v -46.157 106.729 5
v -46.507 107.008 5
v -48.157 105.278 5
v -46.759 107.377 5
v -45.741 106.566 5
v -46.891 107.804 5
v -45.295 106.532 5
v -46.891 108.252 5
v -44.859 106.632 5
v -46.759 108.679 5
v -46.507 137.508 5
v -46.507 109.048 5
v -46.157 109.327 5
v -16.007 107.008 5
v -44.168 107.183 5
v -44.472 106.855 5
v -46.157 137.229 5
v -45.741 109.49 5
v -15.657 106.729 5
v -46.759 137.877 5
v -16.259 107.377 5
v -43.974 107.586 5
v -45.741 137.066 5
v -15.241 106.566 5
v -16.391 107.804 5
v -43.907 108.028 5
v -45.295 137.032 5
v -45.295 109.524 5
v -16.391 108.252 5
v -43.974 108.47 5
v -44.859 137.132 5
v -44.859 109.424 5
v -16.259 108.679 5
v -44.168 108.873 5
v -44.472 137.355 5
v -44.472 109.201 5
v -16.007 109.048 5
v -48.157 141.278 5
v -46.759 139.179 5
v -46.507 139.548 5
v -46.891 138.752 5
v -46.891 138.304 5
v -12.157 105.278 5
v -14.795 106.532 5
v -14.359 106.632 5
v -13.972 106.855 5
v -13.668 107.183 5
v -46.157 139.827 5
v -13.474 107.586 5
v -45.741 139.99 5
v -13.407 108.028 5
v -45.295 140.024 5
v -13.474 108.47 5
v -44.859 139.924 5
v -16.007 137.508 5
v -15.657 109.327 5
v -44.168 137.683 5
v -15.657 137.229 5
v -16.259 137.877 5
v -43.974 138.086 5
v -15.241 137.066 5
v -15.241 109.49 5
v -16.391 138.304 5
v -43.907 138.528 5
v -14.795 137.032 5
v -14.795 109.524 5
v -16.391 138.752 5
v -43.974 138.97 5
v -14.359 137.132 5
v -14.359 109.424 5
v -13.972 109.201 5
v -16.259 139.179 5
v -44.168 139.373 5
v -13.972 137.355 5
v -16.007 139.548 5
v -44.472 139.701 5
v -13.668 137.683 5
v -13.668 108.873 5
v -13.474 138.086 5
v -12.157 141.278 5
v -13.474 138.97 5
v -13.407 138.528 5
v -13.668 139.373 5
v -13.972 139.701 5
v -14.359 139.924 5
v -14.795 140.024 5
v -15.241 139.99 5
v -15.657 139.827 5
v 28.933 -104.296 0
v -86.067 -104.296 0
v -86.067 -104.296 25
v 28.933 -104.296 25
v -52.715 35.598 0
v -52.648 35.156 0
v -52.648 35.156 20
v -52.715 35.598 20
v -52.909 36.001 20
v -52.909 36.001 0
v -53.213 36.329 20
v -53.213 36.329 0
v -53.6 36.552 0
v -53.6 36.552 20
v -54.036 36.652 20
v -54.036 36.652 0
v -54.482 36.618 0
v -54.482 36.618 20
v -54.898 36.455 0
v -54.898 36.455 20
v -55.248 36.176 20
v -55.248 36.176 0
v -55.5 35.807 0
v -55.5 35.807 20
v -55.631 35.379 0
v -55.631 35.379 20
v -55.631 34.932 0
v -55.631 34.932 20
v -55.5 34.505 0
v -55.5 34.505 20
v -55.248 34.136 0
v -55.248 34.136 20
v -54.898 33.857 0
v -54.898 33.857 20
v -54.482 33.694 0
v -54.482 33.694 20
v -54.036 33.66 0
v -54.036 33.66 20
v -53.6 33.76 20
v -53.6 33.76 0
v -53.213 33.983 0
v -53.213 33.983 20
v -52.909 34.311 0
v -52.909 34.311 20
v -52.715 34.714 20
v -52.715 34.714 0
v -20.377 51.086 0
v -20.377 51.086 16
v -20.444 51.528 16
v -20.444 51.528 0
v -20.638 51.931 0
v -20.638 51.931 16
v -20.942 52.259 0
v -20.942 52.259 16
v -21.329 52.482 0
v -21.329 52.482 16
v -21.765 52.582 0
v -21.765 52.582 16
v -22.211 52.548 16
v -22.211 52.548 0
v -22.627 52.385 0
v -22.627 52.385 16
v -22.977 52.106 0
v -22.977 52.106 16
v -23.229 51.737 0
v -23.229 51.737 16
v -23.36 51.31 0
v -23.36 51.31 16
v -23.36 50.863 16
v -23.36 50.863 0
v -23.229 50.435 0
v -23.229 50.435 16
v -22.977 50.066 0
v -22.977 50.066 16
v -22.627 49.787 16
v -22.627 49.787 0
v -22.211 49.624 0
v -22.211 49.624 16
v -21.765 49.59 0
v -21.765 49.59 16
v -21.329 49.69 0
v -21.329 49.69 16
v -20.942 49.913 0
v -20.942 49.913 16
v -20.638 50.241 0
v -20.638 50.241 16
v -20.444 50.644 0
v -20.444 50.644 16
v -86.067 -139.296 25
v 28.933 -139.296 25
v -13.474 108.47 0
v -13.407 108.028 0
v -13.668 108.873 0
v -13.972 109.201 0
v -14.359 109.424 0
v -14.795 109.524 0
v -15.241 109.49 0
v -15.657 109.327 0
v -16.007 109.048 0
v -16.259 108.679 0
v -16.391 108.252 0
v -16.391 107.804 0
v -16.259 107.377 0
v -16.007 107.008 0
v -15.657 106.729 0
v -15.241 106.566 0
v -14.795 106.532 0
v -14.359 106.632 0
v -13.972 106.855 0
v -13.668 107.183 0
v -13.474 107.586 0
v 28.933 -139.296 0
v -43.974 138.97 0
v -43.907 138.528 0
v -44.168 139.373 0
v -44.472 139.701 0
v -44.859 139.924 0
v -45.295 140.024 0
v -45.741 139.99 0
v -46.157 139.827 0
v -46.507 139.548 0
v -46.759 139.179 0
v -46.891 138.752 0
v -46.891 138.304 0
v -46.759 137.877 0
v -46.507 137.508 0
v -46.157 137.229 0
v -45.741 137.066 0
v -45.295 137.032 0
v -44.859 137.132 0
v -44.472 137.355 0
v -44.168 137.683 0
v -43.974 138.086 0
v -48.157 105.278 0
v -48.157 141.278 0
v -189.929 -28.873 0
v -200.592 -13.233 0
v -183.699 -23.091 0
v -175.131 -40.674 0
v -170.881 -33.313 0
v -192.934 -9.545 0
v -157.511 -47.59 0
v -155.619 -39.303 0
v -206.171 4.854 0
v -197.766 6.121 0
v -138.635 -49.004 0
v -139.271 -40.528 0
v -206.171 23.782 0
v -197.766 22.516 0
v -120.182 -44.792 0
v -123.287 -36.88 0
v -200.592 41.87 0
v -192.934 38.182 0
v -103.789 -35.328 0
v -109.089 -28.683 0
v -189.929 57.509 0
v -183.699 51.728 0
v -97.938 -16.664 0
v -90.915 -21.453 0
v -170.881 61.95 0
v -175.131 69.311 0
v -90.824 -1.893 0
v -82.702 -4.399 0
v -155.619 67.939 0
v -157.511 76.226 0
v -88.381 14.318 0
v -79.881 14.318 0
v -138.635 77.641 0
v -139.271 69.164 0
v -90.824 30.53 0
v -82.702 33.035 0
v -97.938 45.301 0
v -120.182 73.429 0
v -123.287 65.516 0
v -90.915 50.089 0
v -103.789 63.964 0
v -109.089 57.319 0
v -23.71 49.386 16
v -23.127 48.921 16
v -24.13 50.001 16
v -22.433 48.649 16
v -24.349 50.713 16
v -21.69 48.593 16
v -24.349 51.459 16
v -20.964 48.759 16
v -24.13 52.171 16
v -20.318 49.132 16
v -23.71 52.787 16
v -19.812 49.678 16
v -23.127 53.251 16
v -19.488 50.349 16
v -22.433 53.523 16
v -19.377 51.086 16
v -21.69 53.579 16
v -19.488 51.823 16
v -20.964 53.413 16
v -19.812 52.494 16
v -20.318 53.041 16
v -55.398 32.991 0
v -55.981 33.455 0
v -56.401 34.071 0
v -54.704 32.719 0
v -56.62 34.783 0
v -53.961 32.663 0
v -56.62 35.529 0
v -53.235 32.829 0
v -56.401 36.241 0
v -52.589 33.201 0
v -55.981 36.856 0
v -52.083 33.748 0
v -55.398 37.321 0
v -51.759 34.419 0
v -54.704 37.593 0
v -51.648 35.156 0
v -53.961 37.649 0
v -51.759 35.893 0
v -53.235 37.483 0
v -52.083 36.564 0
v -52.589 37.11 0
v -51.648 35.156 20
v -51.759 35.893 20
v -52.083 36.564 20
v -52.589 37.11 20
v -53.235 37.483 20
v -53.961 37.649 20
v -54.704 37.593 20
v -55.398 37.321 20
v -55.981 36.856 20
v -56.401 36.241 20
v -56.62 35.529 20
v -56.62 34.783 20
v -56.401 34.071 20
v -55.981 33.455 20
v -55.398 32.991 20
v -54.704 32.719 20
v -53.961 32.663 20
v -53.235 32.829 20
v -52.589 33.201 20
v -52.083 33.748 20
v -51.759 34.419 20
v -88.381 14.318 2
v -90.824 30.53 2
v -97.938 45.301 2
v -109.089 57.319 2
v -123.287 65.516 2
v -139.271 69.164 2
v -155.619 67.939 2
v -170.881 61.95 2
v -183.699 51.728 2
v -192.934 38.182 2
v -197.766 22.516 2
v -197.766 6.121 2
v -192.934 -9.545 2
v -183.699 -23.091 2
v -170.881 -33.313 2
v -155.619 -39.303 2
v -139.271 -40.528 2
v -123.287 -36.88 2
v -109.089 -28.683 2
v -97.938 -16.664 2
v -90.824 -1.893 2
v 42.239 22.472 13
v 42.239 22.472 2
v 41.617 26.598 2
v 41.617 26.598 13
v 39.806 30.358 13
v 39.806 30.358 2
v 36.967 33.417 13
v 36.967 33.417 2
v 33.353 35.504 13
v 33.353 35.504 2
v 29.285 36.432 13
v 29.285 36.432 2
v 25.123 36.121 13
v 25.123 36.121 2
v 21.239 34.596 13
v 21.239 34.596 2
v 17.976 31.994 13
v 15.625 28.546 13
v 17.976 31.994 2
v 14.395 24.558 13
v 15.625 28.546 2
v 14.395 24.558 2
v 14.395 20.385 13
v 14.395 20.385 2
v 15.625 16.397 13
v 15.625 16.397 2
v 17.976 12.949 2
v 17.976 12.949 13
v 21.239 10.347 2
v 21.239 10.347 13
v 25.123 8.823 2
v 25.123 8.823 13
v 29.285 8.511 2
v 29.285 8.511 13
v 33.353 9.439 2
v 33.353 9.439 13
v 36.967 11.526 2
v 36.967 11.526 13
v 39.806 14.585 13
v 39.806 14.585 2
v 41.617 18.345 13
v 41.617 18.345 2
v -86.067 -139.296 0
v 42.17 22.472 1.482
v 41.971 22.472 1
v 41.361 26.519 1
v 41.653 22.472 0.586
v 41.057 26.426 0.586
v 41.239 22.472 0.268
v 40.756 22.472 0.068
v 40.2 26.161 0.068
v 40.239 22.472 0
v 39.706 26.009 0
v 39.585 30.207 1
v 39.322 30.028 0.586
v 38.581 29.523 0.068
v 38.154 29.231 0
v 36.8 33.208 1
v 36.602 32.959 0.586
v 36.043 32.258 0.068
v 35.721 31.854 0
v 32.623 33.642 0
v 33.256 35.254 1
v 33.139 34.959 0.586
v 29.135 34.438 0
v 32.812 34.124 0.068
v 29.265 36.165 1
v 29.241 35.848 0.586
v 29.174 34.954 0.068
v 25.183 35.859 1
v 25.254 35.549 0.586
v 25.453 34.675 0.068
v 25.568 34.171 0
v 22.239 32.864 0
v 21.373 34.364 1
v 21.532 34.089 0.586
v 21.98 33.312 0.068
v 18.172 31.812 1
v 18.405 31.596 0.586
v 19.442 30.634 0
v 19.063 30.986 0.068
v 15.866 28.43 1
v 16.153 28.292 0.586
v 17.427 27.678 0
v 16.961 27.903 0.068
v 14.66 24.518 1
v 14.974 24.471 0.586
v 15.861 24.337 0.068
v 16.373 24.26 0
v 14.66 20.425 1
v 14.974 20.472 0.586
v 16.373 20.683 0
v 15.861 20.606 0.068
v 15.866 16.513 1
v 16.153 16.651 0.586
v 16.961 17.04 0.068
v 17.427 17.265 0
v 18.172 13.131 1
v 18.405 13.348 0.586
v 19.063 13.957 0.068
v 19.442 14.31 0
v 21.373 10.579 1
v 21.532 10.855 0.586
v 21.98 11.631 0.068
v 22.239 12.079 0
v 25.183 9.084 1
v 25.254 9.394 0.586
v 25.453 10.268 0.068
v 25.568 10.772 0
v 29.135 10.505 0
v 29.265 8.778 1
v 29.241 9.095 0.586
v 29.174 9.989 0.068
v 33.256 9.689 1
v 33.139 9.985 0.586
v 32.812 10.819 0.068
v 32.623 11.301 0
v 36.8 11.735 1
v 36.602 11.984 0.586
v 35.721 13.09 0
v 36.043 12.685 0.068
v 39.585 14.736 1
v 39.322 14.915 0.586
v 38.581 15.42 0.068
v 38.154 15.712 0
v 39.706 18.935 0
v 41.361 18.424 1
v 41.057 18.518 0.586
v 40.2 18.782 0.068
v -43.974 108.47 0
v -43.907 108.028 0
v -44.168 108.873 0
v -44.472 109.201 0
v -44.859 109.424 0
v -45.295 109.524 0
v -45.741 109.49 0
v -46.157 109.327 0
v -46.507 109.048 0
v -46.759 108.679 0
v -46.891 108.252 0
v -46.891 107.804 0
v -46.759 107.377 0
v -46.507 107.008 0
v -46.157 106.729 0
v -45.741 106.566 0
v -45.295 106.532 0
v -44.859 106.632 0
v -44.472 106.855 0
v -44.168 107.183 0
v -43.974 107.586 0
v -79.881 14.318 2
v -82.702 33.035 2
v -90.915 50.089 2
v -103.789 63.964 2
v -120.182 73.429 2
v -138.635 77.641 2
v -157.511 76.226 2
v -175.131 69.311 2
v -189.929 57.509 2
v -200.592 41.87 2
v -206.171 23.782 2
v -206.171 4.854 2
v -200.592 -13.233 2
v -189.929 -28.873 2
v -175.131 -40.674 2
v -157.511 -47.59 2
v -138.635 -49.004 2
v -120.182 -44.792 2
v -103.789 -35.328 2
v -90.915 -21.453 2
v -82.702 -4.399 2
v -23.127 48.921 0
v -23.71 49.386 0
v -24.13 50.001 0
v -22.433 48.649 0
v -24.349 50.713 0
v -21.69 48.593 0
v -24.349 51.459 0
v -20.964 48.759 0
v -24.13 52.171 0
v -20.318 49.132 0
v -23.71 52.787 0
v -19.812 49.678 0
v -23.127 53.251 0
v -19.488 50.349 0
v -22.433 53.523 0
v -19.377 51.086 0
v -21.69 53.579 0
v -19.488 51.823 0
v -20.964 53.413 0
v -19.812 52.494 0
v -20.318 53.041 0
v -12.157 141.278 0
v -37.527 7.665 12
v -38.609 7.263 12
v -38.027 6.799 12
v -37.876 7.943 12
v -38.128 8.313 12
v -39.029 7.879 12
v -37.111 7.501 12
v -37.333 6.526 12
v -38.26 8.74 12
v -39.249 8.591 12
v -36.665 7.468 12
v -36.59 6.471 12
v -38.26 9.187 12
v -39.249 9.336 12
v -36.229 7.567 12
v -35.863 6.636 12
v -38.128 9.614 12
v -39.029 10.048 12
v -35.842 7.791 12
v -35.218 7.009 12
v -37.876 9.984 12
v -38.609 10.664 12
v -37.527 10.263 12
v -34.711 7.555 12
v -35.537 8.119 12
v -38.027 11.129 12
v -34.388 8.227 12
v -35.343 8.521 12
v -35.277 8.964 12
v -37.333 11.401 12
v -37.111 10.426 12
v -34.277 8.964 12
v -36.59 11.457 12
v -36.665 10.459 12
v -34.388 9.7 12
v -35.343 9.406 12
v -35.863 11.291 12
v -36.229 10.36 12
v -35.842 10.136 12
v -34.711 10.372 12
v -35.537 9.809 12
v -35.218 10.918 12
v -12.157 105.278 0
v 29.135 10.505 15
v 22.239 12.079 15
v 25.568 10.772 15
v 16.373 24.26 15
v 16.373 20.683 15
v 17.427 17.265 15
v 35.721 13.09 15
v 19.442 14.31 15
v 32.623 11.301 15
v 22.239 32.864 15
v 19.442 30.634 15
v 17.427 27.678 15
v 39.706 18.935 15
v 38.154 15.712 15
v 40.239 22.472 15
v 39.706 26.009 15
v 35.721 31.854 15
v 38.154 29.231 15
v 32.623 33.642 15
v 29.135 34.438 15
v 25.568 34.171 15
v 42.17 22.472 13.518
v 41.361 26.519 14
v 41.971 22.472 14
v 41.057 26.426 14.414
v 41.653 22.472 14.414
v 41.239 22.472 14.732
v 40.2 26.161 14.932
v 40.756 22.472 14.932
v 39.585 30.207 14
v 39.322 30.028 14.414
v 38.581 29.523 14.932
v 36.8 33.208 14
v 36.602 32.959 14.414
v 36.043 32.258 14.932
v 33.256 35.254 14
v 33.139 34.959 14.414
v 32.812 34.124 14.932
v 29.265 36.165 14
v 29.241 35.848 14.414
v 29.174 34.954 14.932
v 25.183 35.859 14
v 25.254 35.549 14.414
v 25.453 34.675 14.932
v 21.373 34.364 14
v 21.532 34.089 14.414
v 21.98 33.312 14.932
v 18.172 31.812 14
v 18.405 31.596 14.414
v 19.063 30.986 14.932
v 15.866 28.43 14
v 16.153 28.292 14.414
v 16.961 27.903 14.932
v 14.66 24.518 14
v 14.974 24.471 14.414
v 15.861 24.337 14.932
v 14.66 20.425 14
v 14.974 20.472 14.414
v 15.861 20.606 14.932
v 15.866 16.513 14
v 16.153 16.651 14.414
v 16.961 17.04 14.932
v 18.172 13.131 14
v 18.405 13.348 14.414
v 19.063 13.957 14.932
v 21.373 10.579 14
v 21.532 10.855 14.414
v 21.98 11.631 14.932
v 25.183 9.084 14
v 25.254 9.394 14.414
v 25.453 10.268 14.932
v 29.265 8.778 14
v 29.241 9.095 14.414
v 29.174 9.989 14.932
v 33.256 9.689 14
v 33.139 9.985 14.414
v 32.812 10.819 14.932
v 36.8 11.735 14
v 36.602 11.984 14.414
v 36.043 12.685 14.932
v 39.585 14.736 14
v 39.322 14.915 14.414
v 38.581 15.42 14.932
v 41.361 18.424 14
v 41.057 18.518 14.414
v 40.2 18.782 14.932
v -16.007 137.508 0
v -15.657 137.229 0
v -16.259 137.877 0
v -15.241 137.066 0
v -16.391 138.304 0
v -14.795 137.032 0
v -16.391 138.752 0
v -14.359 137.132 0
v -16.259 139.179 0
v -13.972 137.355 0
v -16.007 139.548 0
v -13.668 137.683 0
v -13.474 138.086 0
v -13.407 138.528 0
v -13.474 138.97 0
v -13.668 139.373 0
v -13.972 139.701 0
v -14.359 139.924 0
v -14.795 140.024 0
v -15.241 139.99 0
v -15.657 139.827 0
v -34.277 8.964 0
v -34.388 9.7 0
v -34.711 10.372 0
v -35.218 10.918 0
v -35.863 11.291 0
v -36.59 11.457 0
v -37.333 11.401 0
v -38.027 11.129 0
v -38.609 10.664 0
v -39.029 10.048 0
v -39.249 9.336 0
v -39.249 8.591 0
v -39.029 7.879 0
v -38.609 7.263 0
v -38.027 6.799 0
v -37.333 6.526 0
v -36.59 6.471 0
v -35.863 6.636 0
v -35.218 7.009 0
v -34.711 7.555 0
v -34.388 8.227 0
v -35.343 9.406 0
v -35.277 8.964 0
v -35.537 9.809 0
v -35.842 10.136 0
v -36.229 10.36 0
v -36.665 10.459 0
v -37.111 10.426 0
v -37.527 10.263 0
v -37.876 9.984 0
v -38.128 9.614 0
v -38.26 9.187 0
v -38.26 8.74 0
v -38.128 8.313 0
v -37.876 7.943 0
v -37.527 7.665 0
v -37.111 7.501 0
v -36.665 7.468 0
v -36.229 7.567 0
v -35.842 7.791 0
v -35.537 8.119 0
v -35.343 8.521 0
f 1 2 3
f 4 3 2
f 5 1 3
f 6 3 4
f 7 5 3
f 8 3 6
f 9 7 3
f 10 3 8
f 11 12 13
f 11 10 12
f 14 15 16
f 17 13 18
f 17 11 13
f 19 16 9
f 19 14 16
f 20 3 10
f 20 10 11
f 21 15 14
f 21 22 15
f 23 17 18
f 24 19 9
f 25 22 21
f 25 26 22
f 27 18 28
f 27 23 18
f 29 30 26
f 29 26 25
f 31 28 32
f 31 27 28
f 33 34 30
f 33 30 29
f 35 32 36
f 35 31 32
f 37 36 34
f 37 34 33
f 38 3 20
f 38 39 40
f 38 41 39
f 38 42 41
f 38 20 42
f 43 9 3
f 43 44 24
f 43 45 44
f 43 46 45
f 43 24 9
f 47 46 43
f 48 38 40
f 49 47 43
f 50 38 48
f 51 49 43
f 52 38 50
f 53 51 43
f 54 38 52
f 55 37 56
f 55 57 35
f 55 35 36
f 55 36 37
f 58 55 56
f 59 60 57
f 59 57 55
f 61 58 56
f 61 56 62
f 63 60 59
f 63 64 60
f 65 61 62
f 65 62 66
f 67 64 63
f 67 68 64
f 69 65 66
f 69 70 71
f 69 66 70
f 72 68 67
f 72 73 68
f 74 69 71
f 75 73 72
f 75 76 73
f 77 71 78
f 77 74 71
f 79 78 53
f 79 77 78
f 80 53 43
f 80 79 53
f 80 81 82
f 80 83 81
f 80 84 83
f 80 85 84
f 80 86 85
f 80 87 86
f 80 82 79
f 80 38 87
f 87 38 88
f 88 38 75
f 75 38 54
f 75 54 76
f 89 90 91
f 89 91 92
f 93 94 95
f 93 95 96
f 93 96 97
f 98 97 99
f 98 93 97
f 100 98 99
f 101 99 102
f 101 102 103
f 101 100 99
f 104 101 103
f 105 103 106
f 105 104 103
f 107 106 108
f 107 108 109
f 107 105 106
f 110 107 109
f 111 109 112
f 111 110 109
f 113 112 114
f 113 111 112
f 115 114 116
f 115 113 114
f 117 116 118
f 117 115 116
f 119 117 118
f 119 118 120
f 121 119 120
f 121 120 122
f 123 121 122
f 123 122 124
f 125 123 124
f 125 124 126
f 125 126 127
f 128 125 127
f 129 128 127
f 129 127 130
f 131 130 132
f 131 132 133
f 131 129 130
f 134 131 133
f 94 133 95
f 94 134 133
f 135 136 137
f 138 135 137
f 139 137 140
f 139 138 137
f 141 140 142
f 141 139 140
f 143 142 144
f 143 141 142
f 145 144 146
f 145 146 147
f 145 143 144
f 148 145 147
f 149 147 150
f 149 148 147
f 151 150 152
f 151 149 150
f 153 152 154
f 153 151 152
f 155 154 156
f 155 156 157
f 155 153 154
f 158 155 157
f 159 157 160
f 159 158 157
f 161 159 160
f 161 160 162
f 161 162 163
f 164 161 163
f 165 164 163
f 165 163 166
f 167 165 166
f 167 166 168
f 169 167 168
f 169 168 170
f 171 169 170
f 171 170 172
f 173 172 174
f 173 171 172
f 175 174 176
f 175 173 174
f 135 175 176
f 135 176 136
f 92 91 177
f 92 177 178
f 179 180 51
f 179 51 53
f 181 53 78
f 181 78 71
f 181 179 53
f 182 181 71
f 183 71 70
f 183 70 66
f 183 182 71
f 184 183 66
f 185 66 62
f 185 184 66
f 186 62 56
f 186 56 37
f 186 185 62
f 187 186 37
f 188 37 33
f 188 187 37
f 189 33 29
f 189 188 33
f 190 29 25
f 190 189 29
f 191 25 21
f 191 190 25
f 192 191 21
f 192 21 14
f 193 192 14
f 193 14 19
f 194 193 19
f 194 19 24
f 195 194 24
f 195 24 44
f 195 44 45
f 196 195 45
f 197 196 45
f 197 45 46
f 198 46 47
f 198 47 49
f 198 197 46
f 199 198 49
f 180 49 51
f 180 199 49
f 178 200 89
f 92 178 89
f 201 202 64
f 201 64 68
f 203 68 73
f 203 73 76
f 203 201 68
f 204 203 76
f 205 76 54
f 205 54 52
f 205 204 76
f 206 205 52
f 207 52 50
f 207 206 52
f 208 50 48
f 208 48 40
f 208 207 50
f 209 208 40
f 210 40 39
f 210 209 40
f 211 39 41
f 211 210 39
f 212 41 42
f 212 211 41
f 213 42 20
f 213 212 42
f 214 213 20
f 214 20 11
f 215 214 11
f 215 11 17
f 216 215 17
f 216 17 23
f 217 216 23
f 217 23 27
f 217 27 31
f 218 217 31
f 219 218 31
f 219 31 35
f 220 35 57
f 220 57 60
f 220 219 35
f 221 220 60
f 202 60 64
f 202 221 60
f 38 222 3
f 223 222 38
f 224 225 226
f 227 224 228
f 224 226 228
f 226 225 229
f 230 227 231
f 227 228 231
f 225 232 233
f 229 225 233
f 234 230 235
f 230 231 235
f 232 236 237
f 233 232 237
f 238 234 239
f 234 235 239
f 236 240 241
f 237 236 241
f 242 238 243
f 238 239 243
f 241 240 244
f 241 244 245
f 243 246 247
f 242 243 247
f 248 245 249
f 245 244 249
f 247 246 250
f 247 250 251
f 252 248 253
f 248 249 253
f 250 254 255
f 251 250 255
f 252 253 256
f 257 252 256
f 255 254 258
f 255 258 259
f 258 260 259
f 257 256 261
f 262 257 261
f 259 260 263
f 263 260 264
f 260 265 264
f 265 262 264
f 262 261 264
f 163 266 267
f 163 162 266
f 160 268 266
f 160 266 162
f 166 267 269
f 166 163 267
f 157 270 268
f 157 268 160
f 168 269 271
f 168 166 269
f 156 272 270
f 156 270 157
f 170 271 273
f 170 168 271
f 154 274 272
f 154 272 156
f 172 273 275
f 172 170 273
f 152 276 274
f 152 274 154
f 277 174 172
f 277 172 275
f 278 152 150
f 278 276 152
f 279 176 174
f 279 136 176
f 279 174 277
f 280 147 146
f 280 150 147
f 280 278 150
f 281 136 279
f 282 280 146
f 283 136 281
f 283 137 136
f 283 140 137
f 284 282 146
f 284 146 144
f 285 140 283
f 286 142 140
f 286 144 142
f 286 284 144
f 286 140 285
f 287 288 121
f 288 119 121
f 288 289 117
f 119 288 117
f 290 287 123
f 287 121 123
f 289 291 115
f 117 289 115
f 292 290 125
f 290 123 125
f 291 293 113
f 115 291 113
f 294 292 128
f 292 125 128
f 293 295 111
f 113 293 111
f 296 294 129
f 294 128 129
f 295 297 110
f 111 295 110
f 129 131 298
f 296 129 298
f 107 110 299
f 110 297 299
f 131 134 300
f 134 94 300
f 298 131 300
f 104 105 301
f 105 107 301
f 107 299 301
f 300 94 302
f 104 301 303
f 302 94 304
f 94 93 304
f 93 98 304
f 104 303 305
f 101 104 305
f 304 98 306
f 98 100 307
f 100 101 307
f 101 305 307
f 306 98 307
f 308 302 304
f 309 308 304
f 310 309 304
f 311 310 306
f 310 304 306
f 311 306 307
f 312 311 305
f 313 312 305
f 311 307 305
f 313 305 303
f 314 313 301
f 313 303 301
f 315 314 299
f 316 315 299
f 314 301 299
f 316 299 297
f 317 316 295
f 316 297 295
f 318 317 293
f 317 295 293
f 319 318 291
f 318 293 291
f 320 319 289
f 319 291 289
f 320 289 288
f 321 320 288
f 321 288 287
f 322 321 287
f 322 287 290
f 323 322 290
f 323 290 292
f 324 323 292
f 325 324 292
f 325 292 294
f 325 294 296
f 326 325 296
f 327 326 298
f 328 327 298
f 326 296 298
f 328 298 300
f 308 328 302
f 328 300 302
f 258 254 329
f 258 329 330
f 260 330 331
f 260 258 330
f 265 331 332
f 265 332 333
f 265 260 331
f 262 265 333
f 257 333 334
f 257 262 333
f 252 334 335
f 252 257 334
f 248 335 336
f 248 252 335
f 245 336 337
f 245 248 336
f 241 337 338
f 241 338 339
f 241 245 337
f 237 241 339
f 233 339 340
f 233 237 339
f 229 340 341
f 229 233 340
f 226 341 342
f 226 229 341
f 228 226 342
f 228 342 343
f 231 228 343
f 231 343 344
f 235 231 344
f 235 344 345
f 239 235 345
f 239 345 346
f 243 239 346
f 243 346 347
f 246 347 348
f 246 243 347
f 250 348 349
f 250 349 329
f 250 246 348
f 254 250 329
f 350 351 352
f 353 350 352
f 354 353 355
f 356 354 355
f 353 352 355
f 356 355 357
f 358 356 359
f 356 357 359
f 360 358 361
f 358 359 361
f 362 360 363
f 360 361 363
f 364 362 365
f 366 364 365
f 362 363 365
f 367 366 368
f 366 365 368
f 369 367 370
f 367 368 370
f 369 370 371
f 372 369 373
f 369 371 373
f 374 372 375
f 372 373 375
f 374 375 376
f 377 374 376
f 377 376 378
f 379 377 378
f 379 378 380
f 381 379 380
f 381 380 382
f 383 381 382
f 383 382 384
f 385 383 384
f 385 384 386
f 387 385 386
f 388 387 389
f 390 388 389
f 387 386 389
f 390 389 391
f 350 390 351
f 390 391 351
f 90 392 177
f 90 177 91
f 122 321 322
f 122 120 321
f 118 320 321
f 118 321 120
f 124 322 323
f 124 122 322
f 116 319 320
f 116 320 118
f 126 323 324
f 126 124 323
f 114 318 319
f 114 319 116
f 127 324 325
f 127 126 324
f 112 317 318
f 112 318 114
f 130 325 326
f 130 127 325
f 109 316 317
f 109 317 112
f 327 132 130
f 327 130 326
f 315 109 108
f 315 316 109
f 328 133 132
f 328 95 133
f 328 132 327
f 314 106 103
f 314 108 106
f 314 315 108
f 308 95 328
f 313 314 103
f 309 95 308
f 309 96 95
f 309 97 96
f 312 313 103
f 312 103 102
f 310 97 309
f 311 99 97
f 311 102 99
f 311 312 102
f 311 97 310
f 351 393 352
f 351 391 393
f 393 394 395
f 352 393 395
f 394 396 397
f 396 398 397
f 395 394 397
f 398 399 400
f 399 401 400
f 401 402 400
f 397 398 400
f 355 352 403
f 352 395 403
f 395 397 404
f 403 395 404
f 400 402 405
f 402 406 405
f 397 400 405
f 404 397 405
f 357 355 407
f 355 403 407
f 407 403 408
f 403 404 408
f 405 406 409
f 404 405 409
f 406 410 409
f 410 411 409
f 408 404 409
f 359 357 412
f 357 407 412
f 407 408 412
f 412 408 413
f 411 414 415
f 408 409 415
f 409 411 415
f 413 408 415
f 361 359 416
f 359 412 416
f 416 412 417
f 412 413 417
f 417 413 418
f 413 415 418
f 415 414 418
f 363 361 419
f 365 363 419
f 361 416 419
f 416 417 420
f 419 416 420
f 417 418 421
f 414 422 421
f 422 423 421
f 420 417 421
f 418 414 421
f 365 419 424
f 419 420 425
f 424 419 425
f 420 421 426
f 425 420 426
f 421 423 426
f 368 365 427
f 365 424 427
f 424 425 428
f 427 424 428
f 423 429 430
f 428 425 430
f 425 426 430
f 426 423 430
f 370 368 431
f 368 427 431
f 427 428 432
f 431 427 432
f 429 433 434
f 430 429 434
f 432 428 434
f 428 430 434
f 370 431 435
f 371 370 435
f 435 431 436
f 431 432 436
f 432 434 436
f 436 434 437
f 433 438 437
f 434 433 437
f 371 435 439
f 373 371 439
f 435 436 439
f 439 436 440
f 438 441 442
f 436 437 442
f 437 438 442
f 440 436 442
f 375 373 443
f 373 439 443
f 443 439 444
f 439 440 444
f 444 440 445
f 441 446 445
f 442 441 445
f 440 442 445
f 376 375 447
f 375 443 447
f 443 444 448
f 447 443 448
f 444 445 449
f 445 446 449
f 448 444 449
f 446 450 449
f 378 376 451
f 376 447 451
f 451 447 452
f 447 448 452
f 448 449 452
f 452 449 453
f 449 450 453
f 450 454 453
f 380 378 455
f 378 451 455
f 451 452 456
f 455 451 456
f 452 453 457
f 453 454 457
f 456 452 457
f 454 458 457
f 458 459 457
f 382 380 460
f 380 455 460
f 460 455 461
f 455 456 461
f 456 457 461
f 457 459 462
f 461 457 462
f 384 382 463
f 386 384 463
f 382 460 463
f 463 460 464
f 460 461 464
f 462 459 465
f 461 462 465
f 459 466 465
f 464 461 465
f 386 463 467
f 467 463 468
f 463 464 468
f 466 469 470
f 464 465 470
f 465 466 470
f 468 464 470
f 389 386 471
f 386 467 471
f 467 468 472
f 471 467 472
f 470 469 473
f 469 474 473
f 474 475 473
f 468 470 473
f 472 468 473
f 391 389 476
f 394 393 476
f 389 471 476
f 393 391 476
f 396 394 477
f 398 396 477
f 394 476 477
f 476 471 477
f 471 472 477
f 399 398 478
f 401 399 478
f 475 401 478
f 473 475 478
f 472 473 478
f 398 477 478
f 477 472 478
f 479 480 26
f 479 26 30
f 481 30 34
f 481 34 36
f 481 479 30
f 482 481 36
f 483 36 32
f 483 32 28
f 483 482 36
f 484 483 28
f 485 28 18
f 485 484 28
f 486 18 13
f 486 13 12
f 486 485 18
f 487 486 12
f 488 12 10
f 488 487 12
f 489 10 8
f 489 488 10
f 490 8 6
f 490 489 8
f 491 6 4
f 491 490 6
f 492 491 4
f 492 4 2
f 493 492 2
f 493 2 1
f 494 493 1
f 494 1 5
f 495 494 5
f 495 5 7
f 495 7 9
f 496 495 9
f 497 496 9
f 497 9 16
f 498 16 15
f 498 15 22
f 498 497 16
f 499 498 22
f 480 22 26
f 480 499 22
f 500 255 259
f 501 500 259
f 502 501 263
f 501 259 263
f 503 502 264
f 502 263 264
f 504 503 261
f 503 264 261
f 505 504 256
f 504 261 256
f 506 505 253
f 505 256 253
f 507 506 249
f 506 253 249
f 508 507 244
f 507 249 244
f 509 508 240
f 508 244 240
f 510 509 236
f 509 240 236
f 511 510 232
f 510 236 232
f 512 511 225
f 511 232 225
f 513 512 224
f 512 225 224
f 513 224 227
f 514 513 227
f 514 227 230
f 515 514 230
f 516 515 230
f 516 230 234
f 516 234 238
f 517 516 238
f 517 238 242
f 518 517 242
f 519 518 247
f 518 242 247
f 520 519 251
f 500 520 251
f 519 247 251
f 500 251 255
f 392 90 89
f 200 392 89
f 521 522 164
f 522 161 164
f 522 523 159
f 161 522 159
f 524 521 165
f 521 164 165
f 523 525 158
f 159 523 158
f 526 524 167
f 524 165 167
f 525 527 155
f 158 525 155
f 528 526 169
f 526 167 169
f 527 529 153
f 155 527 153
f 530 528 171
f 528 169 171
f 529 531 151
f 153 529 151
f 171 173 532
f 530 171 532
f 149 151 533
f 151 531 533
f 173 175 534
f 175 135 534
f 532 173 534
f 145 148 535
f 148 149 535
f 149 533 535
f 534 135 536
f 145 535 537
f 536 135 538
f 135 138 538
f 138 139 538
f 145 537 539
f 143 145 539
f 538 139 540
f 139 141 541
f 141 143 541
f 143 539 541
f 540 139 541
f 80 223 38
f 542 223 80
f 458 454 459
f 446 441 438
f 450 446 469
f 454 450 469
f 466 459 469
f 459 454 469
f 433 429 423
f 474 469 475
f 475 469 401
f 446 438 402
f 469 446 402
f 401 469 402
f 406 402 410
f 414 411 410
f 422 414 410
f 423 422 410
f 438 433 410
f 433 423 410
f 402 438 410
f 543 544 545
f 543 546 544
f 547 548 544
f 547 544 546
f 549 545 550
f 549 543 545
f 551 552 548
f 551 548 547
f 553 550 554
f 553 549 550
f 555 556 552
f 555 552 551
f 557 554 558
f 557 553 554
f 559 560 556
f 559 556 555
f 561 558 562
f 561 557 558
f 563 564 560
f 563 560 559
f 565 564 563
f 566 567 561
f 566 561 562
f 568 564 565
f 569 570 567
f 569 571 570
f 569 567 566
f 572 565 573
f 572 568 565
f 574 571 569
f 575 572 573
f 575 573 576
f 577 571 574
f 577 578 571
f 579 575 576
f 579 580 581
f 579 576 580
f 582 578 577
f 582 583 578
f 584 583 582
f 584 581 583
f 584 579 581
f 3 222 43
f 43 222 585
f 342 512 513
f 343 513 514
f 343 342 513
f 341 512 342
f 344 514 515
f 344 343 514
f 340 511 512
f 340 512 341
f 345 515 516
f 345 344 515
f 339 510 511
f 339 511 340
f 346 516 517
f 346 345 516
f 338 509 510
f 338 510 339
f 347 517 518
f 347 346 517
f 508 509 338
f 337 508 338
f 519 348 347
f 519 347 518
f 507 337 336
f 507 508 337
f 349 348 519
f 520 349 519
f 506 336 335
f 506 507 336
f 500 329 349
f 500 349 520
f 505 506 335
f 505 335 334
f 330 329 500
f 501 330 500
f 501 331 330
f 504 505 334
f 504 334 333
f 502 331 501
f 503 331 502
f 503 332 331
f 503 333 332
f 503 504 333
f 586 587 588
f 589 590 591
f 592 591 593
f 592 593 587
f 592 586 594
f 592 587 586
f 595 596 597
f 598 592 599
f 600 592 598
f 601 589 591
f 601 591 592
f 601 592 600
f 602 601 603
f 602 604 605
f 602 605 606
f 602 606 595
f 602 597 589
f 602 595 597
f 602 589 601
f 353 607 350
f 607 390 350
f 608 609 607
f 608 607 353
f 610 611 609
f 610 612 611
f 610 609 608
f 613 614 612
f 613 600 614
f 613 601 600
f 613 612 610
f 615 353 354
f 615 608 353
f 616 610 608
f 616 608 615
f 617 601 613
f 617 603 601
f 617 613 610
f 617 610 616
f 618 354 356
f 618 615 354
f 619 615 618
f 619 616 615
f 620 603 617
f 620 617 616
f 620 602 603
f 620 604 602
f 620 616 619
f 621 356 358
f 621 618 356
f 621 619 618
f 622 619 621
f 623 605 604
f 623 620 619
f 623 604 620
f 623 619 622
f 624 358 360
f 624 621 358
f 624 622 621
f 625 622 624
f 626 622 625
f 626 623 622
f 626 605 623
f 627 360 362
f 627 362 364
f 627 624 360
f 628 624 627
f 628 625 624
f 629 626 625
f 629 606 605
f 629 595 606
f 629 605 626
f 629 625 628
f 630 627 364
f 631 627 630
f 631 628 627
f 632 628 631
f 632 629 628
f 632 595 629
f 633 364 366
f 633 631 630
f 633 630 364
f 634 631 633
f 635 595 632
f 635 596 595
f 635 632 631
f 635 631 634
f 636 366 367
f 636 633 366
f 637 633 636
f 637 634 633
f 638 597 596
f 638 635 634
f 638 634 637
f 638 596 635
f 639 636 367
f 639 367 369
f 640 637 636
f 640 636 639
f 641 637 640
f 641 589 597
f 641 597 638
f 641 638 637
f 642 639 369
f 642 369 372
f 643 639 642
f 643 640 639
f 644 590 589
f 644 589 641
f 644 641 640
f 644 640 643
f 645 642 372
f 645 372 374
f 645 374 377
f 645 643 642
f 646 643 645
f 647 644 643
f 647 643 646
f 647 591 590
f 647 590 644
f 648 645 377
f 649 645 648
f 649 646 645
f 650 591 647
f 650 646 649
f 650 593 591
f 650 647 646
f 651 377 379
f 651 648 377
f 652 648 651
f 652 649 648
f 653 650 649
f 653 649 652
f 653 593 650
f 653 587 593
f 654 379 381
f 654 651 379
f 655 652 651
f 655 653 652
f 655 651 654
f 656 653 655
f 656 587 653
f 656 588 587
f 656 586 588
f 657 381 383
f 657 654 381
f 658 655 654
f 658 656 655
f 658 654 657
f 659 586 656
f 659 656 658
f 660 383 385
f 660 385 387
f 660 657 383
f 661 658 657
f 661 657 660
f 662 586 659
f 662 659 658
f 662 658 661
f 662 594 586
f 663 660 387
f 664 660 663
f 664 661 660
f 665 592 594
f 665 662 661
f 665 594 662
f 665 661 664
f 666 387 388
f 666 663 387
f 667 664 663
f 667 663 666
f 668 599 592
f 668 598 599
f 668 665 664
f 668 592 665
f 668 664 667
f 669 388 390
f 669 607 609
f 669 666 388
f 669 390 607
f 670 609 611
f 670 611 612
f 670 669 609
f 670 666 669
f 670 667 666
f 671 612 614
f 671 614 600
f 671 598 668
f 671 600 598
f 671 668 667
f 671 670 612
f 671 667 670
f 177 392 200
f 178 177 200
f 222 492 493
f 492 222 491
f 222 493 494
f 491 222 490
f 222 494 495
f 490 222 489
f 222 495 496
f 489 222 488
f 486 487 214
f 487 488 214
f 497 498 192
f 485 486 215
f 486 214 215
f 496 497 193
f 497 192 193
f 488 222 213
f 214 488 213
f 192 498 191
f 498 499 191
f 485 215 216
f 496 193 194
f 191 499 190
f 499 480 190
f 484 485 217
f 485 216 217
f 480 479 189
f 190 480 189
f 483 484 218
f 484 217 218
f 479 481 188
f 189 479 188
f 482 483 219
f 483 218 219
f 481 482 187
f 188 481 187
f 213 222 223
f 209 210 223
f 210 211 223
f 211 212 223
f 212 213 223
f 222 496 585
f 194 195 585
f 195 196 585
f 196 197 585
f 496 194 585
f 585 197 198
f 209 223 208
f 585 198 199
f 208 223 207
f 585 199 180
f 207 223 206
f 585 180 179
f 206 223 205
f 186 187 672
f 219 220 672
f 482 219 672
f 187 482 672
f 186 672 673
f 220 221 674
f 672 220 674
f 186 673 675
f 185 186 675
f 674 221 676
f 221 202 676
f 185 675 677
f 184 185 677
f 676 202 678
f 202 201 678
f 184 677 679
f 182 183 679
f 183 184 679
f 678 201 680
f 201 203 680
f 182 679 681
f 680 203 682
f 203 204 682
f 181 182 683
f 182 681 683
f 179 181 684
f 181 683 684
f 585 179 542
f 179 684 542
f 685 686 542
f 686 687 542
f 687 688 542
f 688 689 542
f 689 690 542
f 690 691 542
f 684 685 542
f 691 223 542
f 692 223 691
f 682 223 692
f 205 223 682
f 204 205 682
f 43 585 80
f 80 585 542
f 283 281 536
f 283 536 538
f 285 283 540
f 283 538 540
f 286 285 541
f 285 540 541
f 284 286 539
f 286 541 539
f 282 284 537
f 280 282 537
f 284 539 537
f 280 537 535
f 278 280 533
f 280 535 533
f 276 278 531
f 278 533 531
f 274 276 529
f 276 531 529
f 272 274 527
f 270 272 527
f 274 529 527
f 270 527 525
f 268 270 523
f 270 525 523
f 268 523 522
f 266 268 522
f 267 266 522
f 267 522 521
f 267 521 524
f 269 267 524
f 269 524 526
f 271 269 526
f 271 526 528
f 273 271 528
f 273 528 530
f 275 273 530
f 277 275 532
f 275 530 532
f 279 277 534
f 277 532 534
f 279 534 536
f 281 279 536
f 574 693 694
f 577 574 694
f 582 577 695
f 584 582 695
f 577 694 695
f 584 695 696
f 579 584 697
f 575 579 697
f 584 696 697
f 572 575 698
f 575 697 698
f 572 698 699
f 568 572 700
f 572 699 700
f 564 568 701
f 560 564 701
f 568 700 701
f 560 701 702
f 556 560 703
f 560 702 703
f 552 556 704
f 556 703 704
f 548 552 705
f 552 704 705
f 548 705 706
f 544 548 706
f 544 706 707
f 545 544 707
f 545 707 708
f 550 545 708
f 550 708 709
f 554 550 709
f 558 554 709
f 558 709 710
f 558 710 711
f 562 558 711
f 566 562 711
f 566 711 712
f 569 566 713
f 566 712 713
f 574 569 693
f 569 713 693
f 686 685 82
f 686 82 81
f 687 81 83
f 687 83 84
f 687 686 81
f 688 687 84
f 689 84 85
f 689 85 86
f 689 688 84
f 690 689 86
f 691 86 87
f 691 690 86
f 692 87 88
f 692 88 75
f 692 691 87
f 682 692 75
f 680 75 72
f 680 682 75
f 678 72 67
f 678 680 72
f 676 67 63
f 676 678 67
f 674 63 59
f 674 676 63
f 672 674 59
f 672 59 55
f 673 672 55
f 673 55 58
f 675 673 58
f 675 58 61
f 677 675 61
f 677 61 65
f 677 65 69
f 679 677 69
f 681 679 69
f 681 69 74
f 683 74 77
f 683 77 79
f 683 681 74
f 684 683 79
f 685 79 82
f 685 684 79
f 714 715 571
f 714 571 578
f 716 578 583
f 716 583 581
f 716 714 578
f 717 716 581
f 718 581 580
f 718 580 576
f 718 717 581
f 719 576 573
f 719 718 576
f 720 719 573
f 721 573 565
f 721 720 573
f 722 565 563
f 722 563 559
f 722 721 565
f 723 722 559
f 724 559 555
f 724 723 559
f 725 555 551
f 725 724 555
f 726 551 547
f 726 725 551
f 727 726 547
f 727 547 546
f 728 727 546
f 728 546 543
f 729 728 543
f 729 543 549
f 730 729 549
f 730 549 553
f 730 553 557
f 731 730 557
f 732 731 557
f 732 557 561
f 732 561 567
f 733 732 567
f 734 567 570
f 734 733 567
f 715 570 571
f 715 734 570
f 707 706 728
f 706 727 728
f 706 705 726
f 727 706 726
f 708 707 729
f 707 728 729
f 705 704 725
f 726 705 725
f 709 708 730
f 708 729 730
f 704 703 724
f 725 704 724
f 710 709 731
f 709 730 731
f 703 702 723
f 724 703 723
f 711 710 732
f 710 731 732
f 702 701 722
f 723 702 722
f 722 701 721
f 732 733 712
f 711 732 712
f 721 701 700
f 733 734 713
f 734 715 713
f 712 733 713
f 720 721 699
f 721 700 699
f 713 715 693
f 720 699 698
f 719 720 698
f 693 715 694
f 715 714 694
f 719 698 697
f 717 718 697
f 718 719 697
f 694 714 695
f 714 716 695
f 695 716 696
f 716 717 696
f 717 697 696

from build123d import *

# Parameters (mm, degrees)
F0_R      = 2.5
F0_R_2    = 1.5
F1_DEPTH  = 20
F2_R      = 14
F3_DEPTH  = 15
F4_R      = 2
F5_R      = 63.5
F5_R_2    = 55
F6_DEPTH  = 2
F7_R      = 2.5
F7_R_2    = 1.5
F8_DEPTH  = 16
F9_W      = 115
F9_H      = 35
F10_DEPTH = 25
F11_R     = 2.5
F11_R_2   = 1.5
F12_DEPTH = 12
F13_W     = 36
F13_H     = 36
F13_R     = 1.5
F14_DEPTH = 5


with BuildPart() as f1:
    # F0 (on Top) → F1 (new body)
    with BuildSketch(Plane.XY):
        with Locations((-54.148182, 35.155911)):
            Circle(F0_R)
        with Locations((-54.148182, 35.155911)):
            Circle(F0_R_2, mode=Mode.SUBTRACT)
    extrude(amount=F1_DEPTH)


with BuildPart() as f3:
    # F2 (on Top) → F3 (new body)
    with BuildSketch(Plane.XY):
        with Locations((28.238637, 22.471592)):
            Circle(F2_R)
    extrude(amount=F3_DEPTH)

    # F4
    f4_edges = [f3.edges().sort_by_distance(p)[0] for p in [
        (14.238637, 22.471592, 15),
        (14.238637, 22.471592, 0),
    ]]
    fillet(f4_edges, radius=F4_R)


with BuildPart() as f6:
    # F5 (on Top) → F6 (new body)
    with BuildSketch(Plane.XY):
        with Locations((-143.380687, 14.318183)):
            Circle(F5_R)
        with Locations((-143.380687, 14.318183)):
            Circle(F5_R_2, mode=Mode.SUBTRACT)
    extrude(amount=F6_DEPTH)


with BuildPart() as f8:
    # F7 (on Top) → F8 (new body)
    with BuildSketch(Plane.XY):
        with Locations((-21.877097, 51.086083)):
            Circle(F7_R)
        with Locations((-21.877097, 51.086083)):
            Circle(F7_R_2, mode=Mode.SUBTRACT)
    extrude(amount=F8_DEPTH)


with BuildPart() as f10:
    # F9 (on Top) → F10 (new body)
    with BuildSketch(Plane.XY):
        with Locations((-28.567261, -121.795776)):
            Rectangle(F9_W, F9_H)
    extrude(amount=F10_DEPTH)


with BuildPart() as f12:
    # F11 (on Top) → F12 (new body)
    with BuildSketch(Plane.XY):
        with Locations((-36.776777, 8.963598)):
            Circle(F11_R)
        with Locations((-36.776777, 8.963598)):
            Circle(F11_R_2, mode=Mode.SUBTRACT)
    extrude(amount=F12_DEPTH)


with BuildPart() as f14:
    # F13 (on Top) → F14 (new body)
    with BuildSketch(Plane.XY):
        with Locations((-30.157481, 123.278062)):
            Rectangle(F13_W, F13_H)
        with Locations((-45.407481, 108.028062)):
            Circle(F13_R, mode=Mode.SUBTRACT)
        with Locations((-14.907481, 108.028062)):
            Circle(F13_R, mode=Mode.SUBTRACT)
        with Locations((-45.407481, 138.528062)):
            Circle(F13_R, mode=Mode.SUBTRACT)
        with Locations((-14.907481, 138.528062)):
            Circle(F13_R, mode=Mode.SUBTRACT)
    extrude(amount=F14_DEPTH)


solid = Compound([f1.part, f3.part, f6.part, f8.part, f10.part, f12.part, f14.part])
